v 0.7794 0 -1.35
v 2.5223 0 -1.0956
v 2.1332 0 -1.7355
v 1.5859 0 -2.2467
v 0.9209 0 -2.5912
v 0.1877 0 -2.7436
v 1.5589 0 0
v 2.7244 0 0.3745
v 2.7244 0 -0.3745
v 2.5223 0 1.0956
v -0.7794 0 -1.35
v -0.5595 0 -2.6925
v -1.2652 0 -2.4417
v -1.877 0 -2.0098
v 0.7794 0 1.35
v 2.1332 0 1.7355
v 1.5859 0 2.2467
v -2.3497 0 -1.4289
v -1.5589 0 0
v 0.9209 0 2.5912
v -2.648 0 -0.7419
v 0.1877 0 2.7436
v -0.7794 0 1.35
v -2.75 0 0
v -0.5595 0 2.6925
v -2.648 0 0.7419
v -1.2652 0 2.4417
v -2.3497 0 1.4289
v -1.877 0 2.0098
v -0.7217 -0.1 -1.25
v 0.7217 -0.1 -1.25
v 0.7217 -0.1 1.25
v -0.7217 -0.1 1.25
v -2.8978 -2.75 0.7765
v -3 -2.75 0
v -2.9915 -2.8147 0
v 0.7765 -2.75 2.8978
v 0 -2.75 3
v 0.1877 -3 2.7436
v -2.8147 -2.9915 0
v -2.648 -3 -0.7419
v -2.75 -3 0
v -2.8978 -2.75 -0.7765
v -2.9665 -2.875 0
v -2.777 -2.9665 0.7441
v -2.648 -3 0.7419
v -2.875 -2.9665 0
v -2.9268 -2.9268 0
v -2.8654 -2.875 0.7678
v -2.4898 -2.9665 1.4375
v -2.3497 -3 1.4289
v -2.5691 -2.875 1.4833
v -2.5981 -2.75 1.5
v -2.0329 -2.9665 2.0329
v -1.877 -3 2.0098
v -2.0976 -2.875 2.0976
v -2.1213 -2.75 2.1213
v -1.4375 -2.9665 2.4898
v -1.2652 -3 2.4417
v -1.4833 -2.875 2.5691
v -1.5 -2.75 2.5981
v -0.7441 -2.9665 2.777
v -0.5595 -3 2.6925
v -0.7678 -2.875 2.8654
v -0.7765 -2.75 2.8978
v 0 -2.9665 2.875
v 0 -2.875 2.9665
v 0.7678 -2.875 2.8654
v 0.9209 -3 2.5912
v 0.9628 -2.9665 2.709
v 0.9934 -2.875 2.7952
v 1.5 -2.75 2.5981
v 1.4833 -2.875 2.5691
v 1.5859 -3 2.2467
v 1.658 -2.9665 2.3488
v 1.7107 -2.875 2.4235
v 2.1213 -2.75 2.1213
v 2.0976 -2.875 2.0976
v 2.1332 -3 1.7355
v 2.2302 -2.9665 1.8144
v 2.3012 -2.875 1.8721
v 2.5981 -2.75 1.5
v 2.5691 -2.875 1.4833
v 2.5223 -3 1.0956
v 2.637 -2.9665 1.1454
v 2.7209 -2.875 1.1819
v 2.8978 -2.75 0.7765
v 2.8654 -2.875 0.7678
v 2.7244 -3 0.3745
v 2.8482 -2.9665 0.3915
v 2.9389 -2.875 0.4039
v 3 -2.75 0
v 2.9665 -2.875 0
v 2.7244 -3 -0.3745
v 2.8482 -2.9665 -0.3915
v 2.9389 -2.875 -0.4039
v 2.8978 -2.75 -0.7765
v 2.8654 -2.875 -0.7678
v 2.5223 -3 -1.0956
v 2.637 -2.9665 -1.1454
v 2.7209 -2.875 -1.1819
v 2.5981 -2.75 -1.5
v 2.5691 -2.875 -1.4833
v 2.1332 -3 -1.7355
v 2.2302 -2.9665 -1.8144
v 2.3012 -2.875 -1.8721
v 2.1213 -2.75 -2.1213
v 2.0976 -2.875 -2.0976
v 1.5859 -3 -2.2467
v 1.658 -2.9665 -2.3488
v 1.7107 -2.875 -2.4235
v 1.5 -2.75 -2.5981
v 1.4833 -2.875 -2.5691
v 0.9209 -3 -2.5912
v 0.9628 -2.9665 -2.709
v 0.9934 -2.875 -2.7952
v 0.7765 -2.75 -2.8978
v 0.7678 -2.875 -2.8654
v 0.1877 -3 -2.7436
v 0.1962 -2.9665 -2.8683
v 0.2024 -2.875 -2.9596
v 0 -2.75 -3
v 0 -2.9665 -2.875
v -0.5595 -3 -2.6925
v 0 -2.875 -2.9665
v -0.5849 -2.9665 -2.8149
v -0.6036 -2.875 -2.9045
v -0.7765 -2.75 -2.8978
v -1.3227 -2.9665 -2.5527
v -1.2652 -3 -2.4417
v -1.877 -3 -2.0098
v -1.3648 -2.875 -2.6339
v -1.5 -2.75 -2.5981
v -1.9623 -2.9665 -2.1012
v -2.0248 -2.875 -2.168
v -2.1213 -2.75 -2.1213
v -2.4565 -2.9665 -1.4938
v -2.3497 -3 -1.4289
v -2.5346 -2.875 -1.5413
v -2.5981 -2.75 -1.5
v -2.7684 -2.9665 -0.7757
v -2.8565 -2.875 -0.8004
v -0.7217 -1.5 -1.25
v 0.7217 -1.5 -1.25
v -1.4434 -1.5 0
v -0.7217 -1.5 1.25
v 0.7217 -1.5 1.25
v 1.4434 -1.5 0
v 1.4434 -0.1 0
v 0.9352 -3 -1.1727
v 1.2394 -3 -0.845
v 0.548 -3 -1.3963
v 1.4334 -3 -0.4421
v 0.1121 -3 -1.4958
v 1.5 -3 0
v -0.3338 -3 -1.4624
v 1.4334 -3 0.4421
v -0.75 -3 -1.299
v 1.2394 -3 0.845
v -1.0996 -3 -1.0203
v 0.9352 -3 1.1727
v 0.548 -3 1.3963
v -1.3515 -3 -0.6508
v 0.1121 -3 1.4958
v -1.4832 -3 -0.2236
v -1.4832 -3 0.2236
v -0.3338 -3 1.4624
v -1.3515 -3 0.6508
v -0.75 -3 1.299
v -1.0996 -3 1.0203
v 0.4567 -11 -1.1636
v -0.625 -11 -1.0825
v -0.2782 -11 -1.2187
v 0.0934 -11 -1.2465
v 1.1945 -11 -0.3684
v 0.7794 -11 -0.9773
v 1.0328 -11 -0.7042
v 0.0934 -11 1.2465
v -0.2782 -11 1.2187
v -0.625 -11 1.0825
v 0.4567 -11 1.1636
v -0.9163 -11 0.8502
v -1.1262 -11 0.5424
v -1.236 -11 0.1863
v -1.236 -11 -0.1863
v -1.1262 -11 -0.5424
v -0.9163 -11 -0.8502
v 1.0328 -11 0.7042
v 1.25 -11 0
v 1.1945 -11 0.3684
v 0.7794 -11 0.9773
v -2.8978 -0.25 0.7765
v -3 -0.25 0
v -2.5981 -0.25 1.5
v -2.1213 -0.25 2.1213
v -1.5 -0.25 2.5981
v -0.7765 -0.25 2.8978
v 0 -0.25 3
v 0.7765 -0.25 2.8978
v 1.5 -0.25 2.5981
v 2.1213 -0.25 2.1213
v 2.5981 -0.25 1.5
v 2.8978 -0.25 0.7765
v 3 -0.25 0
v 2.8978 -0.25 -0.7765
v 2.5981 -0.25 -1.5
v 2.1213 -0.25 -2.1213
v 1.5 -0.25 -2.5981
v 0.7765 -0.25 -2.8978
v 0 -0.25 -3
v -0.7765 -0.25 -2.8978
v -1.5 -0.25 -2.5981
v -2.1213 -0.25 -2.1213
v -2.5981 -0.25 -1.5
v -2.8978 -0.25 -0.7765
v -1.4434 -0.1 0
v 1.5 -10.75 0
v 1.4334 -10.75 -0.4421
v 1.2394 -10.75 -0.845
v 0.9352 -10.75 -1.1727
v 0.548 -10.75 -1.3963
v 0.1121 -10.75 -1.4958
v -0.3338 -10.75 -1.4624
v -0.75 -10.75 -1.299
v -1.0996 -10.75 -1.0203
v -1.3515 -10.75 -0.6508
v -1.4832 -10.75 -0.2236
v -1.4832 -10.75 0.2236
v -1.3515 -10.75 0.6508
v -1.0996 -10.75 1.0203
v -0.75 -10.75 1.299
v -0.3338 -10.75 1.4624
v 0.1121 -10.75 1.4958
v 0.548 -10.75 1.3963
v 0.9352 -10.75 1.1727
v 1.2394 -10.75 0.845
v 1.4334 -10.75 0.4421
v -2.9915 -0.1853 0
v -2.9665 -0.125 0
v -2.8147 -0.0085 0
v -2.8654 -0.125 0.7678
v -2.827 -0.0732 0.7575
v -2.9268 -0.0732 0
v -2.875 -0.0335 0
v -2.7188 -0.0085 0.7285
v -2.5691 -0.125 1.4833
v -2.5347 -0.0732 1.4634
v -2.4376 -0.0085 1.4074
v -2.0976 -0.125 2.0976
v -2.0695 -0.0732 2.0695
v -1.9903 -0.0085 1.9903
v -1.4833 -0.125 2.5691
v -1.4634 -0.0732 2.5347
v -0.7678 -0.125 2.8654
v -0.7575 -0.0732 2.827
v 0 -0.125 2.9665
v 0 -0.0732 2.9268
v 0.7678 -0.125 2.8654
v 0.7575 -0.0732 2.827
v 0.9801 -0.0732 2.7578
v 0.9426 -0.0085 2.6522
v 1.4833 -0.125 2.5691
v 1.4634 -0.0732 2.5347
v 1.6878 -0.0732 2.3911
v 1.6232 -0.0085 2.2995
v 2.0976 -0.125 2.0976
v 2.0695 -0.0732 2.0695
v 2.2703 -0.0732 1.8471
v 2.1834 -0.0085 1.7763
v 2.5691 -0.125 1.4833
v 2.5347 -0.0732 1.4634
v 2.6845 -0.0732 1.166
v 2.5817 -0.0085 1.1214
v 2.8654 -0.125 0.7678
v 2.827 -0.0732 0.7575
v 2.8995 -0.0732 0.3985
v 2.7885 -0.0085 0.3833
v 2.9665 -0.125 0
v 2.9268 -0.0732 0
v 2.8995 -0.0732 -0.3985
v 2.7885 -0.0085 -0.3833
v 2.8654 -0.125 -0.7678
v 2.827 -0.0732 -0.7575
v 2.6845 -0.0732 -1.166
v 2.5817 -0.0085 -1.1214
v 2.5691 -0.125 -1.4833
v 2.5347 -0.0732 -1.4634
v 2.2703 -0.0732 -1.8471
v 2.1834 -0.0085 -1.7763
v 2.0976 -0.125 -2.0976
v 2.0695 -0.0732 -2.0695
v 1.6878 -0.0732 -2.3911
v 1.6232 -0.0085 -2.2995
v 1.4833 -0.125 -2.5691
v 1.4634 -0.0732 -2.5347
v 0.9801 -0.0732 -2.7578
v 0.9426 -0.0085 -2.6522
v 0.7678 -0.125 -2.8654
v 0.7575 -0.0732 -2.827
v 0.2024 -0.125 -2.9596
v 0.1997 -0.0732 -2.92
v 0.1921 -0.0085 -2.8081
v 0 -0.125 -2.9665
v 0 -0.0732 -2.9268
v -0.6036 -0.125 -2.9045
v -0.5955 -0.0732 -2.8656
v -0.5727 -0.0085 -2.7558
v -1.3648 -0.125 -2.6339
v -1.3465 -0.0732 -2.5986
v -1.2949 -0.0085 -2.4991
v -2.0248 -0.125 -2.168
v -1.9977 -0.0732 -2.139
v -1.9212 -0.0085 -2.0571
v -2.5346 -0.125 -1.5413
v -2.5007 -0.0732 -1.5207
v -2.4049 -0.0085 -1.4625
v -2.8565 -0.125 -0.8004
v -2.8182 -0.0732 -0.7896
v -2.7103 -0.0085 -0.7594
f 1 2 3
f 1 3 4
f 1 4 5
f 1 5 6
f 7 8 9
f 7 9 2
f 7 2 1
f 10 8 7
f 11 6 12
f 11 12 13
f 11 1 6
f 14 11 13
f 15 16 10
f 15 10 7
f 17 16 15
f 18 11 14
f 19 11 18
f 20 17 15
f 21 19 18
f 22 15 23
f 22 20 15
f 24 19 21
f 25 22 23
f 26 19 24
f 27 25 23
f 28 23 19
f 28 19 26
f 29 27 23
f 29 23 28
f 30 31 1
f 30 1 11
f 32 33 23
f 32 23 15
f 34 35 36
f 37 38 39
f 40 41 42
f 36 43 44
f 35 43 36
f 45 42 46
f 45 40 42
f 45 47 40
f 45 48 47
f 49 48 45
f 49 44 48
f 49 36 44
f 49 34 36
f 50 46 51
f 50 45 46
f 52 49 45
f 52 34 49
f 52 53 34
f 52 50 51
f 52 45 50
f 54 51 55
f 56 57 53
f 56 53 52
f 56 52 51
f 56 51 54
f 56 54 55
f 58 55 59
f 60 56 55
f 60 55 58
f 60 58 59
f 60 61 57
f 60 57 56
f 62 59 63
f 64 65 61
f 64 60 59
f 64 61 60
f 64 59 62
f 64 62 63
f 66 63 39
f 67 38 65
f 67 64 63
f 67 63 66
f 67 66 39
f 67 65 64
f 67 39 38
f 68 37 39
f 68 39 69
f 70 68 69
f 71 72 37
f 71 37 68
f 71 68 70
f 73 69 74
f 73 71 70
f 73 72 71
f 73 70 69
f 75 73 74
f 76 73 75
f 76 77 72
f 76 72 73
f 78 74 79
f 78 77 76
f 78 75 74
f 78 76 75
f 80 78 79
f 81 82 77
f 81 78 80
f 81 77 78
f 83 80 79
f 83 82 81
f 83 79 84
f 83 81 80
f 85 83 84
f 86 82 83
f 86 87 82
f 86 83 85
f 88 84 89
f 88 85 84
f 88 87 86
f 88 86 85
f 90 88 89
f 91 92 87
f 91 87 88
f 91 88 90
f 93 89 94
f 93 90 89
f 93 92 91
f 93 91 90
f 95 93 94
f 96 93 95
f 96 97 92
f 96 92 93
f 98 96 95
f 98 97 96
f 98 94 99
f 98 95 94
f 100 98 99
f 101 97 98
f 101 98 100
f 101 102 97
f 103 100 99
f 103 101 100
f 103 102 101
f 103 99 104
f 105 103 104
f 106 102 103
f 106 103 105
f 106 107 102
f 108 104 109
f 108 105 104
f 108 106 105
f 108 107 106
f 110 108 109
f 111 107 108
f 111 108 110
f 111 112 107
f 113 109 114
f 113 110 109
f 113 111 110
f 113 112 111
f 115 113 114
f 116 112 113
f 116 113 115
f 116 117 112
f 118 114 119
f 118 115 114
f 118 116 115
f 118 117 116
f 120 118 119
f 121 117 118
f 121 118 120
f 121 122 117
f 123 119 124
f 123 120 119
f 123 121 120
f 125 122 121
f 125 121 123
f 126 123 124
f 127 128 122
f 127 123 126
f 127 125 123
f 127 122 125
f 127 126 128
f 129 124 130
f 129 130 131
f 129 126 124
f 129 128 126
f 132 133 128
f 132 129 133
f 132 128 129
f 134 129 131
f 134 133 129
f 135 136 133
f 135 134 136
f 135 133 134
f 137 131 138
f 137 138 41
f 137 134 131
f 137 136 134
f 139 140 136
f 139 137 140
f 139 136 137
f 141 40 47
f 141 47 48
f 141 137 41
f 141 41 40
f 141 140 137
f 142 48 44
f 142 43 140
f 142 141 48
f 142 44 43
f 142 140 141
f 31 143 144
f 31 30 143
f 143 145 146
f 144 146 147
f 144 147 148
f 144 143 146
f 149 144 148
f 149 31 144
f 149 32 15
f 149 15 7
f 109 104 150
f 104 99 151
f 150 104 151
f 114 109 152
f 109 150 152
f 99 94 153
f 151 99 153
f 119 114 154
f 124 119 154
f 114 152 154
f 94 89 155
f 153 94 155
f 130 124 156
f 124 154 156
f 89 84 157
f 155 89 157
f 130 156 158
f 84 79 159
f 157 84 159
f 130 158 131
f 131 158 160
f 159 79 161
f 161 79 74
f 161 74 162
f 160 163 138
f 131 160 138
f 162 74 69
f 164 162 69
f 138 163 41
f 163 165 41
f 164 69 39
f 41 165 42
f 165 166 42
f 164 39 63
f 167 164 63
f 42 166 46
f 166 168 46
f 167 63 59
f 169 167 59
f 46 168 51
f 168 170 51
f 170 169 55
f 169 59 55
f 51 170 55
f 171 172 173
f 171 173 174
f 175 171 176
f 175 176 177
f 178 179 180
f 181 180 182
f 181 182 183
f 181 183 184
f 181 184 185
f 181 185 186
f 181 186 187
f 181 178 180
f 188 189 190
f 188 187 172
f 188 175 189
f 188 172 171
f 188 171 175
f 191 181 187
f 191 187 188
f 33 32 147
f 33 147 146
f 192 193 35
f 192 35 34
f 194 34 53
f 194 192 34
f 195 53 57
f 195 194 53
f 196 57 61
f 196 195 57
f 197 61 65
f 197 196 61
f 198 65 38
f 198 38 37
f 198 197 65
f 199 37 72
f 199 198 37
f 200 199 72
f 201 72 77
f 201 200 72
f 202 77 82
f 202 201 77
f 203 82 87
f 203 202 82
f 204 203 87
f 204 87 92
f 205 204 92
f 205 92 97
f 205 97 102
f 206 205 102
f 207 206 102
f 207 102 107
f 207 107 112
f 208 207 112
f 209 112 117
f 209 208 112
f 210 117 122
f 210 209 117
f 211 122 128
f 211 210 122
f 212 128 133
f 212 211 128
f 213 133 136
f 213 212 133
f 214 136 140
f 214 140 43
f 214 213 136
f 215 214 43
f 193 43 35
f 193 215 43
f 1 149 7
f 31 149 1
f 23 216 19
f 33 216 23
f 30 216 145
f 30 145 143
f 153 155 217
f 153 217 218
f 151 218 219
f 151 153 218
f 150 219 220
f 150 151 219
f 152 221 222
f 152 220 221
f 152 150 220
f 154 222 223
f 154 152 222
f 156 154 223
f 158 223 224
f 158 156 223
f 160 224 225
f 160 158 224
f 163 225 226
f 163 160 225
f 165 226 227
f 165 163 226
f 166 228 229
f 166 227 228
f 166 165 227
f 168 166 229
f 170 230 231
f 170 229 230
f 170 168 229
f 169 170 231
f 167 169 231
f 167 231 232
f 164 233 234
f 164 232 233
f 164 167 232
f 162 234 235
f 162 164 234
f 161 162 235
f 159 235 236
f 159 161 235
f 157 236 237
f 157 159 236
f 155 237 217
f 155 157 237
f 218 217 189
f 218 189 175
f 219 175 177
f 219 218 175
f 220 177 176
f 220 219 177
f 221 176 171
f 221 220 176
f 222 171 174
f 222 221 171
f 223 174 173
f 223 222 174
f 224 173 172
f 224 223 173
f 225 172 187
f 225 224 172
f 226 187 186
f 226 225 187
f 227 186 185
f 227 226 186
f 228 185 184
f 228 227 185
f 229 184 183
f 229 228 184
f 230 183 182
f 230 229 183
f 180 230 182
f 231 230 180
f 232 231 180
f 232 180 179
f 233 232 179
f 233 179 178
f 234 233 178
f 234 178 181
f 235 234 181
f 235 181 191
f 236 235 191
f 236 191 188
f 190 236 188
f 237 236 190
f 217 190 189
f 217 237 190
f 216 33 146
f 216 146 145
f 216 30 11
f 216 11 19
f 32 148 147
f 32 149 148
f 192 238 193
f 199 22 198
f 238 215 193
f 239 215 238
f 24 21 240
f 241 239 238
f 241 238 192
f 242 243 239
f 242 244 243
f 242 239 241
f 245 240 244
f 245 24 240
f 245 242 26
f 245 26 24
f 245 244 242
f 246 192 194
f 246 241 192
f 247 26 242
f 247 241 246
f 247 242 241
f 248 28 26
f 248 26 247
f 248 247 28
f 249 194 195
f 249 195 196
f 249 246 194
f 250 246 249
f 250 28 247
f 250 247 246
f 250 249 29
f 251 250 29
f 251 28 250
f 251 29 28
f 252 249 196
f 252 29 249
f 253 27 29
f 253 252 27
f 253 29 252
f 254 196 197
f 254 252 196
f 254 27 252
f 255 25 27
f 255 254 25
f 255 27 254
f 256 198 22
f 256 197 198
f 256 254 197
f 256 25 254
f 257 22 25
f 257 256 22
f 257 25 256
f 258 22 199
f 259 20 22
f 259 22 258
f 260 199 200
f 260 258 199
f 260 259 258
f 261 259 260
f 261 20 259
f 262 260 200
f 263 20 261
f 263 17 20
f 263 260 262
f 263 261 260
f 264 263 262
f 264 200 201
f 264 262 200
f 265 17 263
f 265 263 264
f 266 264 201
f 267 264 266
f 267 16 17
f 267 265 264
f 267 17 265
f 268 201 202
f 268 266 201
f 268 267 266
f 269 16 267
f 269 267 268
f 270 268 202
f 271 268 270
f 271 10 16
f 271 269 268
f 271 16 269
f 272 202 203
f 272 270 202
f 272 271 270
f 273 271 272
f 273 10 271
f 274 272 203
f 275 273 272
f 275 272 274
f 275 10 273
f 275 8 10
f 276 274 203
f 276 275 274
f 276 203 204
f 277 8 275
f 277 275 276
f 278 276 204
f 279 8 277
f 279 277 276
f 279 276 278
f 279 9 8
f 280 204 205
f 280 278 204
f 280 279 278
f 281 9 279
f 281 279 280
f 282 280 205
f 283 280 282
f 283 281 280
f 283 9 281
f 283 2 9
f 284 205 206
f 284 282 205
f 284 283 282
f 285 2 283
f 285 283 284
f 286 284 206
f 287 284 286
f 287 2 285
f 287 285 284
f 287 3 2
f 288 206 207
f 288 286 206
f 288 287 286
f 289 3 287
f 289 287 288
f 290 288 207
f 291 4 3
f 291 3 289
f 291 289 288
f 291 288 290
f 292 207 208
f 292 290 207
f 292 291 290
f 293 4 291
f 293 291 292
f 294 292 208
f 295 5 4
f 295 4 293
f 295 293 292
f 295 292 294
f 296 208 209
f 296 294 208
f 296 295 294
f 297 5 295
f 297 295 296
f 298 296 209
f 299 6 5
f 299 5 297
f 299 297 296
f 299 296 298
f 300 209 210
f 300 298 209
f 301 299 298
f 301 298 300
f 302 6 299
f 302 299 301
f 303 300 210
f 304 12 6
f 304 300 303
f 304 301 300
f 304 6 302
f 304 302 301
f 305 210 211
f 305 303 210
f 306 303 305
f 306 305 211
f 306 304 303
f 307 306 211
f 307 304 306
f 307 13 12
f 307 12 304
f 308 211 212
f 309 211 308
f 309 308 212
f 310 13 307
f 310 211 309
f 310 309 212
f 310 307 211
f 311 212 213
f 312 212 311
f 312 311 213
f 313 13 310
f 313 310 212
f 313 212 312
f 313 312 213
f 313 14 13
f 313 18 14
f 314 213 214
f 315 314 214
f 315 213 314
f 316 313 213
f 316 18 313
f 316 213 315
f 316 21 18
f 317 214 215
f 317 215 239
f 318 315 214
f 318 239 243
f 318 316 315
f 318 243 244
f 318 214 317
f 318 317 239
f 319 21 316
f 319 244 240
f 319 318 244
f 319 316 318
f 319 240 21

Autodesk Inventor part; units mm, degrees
ref_plane "YZ Plane" through (0, 0, 0) normal (1, 0, 0) x (0, 1, 0)
ref_plane "XZ Plane" through (0, 0, 0) normal (0, 1, 0) x (-1, 0, 0)
ref_plane "XY Plane" through (0, 0, 0) normal (0, 0, 1) x (1, 0, 0)
sketch "Sketch1" plane through (0, 0, 0) normal (0, 1, 0) x (-1, 0, 0)
  circle A0 centre (0, 0) radius 3
  dimension "d0" = 6
extrude "Extrusion1" add sketch "Sketch1" against normal blind 3
sketch "Sketch2" plane through (0, -3, 0) normal (0, -1, 0) x (1, 0, 0)
  circle A0 centre (0, 0) radius 1.5
  dimension "d3" = 3
extrude "Extrusion2" add sketch "Sketch2" along normal blind 8
sketch "Sketch3" plane through (0, 0, 0) normal (0, 1, 0) x (1, 0, 0)
  circle A0 centre (0, 0) radius 1.5 construction
  line L0 (1.4434, 0) -> (0.7217, -1.25)
  line L1 (0.7217, -1.25) -> (-0.7217, -1.25)
  line L2 (-0.7217, -1.25) -> (-1.4434, 0)
  line L3 (-1.4434, 0) -> (-0.7217, 1.25)
  line L4 (-0.7217, 1.25) -> (0.7217, 1.25)
  line L5 (0.7217, 1.25) -> (1.4434, 0)
  dimension "d8" = 2.5
extrude "Extrusion3" cut sketch "Sketch3" against normal blind 1.5
chamfer "Chamfer1" distance 0.25 angle 45 1 edges at (-1.5, -11, 0)
fillet "Fillet1" radius 0.25 2 edges at (3, 0, 0) (3, -3, 0)
chamfer "Chamfer2" distance 0.1 angle 45 6 edges at (0, 0, -1.25) (1.0825, 0, -0.625) (1.0825, 0, 0.625) (0, 0, 1.25) (-1.0825, 0, 0.625) (-1.0825, 0, -0.625)
thread "Thread2" size "M3x0.5" class "6g" standard "ANSI Metric M Profile" full length
properties part number "M3-8" material "Steel, Carbon"
